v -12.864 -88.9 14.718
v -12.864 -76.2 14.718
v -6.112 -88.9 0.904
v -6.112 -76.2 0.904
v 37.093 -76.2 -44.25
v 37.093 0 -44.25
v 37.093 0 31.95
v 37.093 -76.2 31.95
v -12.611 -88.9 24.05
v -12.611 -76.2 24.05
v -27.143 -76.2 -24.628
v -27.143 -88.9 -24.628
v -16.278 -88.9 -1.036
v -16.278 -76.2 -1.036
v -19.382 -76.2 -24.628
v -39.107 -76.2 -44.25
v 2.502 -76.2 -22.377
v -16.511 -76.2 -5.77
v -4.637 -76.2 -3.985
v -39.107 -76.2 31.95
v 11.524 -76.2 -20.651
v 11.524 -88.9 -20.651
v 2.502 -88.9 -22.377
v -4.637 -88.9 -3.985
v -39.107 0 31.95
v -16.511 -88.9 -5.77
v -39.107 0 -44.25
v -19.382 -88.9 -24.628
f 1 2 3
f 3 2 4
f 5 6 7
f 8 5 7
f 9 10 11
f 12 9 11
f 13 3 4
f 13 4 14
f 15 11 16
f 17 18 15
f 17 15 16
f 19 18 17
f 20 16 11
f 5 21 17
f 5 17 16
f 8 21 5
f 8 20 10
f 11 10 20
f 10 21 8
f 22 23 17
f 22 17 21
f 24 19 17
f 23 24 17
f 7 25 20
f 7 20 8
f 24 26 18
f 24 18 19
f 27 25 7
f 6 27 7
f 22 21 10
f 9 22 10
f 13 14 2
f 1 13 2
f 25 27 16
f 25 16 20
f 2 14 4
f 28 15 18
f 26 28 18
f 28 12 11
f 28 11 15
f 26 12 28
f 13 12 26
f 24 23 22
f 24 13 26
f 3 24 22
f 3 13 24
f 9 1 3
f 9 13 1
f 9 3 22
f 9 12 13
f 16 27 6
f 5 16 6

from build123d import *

# Parameters (mm, degrees)
F0_W     = 76.2
F0_H     = 76.2
F1_DEPTH = 76.2
F3_DEPTH = 12.7


with BuildPart() as f1:
    # F0 (on Front) → F1 (new body)
    with BuildSketch(Plane.XZ):
        with Locations((-1.006738, -6.150359)):
            Rectangle(F0_W, F0_H)
    extrude(amount=F1_DEPTH)

    # F2 (on face) → F3 (join)
    with BuildSketch(Plane.XZ.offset(76.2)):
        Polygon((-12.611179, 24.049623), (-27.142872, -24.627578), (-19.382371, -24.627578), (-16.510986, -5.769558), (-4.637417, -3.984643), (2.502245, -22.377034), (11.523983, -20.650868), align=None)
        Polygon((-6.111912, 0.904474), (-16.27817, -1.035652), (-12.863549, 14.718168), align=None, mode=Mode.SUBTRACT)
    extrude(amount=F3_DEPTH)


solid = f1.part
